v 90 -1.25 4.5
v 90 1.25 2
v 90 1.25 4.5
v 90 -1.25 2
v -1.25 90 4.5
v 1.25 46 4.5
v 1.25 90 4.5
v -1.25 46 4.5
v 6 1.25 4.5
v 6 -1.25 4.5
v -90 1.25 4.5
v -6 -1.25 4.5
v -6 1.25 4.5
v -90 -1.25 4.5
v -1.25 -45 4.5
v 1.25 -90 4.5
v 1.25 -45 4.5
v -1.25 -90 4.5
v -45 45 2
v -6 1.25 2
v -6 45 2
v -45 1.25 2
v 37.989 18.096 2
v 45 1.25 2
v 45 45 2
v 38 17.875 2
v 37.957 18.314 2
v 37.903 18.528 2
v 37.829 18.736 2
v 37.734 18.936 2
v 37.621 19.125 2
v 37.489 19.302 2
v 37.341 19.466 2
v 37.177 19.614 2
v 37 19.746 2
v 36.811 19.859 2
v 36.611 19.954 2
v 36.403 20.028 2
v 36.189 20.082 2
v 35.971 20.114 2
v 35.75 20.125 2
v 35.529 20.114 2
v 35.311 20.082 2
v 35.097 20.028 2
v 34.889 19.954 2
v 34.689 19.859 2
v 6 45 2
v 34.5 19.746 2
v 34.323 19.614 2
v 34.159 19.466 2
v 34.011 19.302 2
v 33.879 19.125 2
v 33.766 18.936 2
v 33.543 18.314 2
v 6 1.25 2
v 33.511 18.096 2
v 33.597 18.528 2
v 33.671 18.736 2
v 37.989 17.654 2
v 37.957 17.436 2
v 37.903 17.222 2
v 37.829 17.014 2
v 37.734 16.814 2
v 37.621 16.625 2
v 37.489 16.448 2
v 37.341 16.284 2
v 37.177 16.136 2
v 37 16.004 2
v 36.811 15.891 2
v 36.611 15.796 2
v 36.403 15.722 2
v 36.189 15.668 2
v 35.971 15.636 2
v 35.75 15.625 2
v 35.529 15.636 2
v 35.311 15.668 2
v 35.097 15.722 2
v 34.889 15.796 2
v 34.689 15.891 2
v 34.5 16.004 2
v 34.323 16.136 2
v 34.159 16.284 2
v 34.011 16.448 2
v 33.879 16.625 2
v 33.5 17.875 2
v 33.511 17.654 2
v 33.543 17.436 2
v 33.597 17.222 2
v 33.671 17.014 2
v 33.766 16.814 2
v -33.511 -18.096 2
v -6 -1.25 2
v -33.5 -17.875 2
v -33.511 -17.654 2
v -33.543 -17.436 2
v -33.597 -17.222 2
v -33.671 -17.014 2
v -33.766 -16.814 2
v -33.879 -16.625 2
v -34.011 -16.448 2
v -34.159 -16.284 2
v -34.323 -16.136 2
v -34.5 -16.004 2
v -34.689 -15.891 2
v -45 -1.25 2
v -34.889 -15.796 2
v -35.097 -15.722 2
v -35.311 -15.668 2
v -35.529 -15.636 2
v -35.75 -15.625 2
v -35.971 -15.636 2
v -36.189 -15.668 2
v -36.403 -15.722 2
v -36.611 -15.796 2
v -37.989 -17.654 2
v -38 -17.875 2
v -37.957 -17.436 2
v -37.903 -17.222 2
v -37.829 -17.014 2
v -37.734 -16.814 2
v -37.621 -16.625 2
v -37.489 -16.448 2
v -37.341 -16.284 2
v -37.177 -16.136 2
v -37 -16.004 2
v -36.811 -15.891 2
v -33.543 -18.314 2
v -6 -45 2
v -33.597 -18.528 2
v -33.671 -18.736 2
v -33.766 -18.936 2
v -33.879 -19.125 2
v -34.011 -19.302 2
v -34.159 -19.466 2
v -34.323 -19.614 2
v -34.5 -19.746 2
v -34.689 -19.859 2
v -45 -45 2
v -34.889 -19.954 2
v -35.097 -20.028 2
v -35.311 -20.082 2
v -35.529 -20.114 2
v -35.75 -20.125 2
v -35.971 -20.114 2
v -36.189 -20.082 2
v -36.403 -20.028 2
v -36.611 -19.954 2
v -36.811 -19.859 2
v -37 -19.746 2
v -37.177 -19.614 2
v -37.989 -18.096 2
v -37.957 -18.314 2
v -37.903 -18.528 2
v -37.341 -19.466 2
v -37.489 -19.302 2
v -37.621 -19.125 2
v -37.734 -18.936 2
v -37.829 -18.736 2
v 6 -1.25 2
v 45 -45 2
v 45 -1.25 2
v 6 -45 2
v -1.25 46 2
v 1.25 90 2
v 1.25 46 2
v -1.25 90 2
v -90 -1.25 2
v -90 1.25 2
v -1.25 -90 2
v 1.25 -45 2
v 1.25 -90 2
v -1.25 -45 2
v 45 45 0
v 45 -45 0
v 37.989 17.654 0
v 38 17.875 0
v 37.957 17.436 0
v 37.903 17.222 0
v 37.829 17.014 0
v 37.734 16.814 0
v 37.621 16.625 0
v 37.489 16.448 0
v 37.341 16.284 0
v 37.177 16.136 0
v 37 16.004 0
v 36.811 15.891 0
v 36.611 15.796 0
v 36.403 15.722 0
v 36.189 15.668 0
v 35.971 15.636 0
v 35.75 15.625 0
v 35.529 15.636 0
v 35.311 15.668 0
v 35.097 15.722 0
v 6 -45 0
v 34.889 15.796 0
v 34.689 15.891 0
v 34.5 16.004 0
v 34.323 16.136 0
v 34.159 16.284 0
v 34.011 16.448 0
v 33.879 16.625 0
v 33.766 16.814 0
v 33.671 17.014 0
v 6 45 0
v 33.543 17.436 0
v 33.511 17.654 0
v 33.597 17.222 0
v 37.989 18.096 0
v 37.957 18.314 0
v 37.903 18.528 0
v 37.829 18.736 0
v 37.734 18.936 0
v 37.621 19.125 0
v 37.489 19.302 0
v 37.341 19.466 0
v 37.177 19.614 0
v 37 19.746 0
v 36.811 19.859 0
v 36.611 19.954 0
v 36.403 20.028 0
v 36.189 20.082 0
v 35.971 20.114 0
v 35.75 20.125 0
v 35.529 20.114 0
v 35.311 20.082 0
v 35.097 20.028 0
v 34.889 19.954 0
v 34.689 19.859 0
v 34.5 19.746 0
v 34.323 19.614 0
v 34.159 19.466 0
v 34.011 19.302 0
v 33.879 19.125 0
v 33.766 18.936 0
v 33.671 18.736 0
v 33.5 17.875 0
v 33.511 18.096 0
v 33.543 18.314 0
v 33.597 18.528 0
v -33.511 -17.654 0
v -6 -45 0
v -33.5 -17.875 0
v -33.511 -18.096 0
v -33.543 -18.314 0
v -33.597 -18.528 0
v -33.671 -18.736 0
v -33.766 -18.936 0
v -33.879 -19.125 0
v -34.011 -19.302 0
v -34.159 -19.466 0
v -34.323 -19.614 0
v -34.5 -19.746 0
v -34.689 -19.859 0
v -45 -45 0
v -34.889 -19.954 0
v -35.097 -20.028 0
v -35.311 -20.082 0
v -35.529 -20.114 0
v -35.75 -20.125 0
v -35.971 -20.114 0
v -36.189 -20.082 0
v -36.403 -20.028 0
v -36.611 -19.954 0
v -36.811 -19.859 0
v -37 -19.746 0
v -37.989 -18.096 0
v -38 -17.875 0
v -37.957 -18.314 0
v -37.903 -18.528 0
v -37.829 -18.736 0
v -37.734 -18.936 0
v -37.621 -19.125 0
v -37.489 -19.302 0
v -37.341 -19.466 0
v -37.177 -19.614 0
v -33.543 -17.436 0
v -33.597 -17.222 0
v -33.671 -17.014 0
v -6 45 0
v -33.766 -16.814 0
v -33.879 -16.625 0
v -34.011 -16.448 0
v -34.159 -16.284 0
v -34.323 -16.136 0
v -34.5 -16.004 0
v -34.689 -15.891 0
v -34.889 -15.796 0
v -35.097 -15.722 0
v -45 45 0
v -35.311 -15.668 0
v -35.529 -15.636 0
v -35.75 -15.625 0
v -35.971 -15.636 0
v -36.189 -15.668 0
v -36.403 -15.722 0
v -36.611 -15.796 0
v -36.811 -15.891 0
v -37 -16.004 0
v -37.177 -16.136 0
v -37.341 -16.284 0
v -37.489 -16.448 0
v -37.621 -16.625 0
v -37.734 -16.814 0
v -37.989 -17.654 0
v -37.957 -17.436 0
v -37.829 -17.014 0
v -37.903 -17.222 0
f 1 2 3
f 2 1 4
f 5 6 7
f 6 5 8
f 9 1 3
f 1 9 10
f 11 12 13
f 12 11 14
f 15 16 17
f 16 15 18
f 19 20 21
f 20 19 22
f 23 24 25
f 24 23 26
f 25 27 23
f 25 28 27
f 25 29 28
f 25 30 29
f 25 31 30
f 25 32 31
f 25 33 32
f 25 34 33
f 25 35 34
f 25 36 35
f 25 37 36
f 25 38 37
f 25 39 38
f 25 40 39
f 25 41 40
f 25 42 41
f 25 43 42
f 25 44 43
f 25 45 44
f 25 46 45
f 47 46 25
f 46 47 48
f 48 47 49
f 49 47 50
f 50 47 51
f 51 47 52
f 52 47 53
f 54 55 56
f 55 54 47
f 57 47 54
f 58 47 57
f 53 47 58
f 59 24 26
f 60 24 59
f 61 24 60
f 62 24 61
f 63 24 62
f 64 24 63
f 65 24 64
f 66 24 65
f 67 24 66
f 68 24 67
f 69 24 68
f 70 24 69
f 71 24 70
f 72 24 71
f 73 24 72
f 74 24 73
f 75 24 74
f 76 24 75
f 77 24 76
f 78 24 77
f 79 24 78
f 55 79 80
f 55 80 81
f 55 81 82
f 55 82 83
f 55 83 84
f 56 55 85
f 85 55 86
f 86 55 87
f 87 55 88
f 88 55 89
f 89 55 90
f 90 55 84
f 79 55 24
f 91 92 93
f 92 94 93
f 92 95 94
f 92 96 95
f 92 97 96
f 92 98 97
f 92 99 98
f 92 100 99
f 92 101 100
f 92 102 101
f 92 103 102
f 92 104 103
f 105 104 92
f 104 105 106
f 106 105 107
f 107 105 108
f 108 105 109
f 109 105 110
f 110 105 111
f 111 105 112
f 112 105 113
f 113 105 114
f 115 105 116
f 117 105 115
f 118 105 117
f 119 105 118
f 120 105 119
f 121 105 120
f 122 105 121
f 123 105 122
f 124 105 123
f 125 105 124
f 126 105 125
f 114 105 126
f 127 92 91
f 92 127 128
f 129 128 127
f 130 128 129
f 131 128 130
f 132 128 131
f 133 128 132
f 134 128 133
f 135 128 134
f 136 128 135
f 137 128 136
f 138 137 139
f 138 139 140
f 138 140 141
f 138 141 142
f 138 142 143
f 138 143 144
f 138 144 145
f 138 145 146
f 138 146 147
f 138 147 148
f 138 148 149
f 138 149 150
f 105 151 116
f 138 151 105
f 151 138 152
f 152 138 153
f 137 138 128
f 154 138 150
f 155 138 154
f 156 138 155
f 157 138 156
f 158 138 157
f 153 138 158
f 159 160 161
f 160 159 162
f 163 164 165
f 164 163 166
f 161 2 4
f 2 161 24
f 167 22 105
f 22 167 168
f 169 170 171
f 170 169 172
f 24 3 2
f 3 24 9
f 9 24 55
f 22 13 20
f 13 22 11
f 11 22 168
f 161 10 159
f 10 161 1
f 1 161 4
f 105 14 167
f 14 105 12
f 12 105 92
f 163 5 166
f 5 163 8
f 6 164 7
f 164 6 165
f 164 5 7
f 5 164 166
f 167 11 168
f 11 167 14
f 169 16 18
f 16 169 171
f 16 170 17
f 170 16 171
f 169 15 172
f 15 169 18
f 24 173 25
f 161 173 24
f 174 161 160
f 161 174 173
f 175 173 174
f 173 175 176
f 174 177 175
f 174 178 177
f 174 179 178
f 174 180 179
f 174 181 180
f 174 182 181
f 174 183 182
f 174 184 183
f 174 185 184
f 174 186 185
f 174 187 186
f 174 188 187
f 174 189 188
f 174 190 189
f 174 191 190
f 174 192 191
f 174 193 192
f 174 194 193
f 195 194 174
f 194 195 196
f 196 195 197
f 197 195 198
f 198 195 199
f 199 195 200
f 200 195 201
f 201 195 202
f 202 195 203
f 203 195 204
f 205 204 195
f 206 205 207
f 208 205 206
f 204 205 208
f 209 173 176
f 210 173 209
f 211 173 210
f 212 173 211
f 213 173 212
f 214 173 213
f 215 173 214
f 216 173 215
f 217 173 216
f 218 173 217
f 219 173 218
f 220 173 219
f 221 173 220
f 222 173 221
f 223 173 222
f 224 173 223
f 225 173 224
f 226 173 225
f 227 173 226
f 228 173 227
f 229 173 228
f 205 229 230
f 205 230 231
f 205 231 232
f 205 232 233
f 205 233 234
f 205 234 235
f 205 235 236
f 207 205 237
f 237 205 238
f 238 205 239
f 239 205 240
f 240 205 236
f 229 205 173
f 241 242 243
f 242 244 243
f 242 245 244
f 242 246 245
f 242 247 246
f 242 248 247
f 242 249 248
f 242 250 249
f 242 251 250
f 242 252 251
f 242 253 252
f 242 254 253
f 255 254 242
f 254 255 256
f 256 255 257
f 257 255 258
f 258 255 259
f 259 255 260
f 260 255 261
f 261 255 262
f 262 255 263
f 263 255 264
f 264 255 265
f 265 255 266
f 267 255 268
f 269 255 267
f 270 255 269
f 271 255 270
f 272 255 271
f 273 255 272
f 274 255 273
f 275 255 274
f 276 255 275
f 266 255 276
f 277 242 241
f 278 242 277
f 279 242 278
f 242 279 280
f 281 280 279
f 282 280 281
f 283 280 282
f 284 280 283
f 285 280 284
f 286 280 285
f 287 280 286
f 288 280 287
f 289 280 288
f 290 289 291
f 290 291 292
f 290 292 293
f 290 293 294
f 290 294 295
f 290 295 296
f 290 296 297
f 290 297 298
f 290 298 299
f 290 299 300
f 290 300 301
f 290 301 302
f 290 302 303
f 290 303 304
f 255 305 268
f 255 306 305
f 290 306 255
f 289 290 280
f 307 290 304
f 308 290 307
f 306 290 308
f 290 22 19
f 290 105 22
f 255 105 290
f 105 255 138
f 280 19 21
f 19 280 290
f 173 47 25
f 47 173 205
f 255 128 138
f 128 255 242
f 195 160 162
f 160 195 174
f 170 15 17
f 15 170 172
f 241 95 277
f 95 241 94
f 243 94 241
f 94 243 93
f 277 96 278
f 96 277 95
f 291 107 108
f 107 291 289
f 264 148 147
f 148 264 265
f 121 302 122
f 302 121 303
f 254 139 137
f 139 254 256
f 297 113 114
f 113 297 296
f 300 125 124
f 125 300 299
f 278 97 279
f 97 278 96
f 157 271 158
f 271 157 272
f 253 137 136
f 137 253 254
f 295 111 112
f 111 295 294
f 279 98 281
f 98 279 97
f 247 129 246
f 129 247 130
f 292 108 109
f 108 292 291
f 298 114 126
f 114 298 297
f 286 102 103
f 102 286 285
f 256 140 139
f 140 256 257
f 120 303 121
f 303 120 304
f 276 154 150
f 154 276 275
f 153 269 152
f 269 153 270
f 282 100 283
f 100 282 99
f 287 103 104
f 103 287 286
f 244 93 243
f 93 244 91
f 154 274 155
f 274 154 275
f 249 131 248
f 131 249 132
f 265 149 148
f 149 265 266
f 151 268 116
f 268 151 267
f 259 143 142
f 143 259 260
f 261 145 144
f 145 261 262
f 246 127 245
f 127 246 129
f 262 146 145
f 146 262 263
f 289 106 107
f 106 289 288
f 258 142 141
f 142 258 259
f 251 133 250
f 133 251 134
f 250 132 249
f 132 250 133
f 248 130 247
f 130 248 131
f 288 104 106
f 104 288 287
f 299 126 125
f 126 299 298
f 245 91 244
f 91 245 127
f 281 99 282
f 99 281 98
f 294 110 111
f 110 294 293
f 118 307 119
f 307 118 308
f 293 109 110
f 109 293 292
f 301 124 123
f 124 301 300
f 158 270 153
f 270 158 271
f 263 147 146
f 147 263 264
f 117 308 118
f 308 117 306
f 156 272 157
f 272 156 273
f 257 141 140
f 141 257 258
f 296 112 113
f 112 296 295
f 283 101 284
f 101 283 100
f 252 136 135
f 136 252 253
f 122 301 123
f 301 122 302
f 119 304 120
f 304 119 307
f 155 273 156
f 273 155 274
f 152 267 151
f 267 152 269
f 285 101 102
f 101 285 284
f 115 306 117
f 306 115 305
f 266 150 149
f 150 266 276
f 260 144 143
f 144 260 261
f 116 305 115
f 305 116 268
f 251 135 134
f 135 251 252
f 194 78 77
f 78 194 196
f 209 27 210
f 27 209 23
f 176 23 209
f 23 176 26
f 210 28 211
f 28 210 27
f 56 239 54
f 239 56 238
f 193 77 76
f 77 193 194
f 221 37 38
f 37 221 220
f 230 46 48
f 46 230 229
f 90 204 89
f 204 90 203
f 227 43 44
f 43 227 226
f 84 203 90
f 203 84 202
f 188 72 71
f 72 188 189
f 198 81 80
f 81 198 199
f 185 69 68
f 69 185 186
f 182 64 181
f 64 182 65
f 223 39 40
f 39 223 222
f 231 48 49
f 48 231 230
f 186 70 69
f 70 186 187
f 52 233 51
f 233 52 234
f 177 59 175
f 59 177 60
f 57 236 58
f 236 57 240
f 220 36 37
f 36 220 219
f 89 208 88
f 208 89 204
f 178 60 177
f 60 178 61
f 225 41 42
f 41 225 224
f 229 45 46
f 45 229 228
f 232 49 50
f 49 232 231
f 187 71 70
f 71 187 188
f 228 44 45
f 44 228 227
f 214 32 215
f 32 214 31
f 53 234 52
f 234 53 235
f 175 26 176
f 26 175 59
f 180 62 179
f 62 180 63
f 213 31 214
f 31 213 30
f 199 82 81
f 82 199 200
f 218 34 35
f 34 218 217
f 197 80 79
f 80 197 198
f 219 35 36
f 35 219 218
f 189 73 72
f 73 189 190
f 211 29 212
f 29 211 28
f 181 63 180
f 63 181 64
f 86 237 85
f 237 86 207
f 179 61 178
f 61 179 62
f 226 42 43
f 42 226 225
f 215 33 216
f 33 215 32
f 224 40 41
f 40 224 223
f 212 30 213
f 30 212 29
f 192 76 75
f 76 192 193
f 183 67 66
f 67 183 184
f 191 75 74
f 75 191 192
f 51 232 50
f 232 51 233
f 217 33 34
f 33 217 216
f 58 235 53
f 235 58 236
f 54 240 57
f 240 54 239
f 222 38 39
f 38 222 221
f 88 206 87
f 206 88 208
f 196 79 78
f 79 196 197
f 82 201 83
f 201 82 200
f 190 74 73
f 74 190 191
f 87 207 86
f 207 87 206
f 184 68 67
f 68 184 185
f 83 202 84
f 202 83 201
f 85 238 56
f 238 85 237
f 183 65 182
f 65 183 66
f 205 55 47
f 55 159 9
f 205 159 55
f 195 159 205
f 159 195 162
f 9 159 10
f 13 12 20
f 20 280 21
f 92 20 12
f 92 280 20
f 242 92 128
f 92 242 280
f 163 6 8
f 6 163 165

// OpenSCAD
// DIY magnetic stirrer housing - 80 mm PC case fan adapter
// Print orientation: top plate down on bed (z = 0), open box upward

// ---------- Dimensions ----------
outer_size    = 90;    // outer size of top plate and box (X x Y)
plate_thick   = 2;     // top plate thickness (z = 0 to 2)
wall_thick    = 2.5;   // wall thickness (z = 2 to 40)
box_height    = 40;    // inner height of box from top plate
total_height  = plate_thick + wall_thick;  // 42 mm overall

screw_d       = 4.5;   // M4 screw hole diameter
screw_pitch   = 71.5;  // centre-to-centre screw pattern size
screw_count   = 4;     // number of screw holes

notch_width   = 12;    // power cable notch width
notch_depth   = 8;     // notch depth from open edge (z = 32 to 40)

eps           = 0.5;   // cutter overshoot past faces

$fn = 64;

// ---------- Model ----------
difference() {
    union() {
        // Top plate
        translate([-outer_size/2, -outer_size/2, 0])
            cube([outer_size, outer_size, plate_thick]);

        // Four walls, centred on origin in X/Y, rising from z = plate_thick
        for (a = [0, 90, 180, 270])
            rotate([0, 0, a])
                translate([0, -wall_thick/2, plate_thick])
                    cube([outer_size, wall_thick, wall_thick]);
    }

    // Screw holes through top plate on square pattern
    for (i = [0 : screw_count - 1]) {
        x = (i % 2 - 0.5) * screw_pitch;
        y = (i / 2 - 0.25) * screw_pitch;
        translate([x, y, -eps])
            cylinder(d = screw_d, h = plate_thick + 2*eps);
    }

    // Cable notch in one wall, from z = 32 to open edge
    translate([-notch_width/2, -outer_size/2, total_height - notch_depth])
        cube([notch_width, outer_size + 2*eps, notch_depth + eps]);
}
